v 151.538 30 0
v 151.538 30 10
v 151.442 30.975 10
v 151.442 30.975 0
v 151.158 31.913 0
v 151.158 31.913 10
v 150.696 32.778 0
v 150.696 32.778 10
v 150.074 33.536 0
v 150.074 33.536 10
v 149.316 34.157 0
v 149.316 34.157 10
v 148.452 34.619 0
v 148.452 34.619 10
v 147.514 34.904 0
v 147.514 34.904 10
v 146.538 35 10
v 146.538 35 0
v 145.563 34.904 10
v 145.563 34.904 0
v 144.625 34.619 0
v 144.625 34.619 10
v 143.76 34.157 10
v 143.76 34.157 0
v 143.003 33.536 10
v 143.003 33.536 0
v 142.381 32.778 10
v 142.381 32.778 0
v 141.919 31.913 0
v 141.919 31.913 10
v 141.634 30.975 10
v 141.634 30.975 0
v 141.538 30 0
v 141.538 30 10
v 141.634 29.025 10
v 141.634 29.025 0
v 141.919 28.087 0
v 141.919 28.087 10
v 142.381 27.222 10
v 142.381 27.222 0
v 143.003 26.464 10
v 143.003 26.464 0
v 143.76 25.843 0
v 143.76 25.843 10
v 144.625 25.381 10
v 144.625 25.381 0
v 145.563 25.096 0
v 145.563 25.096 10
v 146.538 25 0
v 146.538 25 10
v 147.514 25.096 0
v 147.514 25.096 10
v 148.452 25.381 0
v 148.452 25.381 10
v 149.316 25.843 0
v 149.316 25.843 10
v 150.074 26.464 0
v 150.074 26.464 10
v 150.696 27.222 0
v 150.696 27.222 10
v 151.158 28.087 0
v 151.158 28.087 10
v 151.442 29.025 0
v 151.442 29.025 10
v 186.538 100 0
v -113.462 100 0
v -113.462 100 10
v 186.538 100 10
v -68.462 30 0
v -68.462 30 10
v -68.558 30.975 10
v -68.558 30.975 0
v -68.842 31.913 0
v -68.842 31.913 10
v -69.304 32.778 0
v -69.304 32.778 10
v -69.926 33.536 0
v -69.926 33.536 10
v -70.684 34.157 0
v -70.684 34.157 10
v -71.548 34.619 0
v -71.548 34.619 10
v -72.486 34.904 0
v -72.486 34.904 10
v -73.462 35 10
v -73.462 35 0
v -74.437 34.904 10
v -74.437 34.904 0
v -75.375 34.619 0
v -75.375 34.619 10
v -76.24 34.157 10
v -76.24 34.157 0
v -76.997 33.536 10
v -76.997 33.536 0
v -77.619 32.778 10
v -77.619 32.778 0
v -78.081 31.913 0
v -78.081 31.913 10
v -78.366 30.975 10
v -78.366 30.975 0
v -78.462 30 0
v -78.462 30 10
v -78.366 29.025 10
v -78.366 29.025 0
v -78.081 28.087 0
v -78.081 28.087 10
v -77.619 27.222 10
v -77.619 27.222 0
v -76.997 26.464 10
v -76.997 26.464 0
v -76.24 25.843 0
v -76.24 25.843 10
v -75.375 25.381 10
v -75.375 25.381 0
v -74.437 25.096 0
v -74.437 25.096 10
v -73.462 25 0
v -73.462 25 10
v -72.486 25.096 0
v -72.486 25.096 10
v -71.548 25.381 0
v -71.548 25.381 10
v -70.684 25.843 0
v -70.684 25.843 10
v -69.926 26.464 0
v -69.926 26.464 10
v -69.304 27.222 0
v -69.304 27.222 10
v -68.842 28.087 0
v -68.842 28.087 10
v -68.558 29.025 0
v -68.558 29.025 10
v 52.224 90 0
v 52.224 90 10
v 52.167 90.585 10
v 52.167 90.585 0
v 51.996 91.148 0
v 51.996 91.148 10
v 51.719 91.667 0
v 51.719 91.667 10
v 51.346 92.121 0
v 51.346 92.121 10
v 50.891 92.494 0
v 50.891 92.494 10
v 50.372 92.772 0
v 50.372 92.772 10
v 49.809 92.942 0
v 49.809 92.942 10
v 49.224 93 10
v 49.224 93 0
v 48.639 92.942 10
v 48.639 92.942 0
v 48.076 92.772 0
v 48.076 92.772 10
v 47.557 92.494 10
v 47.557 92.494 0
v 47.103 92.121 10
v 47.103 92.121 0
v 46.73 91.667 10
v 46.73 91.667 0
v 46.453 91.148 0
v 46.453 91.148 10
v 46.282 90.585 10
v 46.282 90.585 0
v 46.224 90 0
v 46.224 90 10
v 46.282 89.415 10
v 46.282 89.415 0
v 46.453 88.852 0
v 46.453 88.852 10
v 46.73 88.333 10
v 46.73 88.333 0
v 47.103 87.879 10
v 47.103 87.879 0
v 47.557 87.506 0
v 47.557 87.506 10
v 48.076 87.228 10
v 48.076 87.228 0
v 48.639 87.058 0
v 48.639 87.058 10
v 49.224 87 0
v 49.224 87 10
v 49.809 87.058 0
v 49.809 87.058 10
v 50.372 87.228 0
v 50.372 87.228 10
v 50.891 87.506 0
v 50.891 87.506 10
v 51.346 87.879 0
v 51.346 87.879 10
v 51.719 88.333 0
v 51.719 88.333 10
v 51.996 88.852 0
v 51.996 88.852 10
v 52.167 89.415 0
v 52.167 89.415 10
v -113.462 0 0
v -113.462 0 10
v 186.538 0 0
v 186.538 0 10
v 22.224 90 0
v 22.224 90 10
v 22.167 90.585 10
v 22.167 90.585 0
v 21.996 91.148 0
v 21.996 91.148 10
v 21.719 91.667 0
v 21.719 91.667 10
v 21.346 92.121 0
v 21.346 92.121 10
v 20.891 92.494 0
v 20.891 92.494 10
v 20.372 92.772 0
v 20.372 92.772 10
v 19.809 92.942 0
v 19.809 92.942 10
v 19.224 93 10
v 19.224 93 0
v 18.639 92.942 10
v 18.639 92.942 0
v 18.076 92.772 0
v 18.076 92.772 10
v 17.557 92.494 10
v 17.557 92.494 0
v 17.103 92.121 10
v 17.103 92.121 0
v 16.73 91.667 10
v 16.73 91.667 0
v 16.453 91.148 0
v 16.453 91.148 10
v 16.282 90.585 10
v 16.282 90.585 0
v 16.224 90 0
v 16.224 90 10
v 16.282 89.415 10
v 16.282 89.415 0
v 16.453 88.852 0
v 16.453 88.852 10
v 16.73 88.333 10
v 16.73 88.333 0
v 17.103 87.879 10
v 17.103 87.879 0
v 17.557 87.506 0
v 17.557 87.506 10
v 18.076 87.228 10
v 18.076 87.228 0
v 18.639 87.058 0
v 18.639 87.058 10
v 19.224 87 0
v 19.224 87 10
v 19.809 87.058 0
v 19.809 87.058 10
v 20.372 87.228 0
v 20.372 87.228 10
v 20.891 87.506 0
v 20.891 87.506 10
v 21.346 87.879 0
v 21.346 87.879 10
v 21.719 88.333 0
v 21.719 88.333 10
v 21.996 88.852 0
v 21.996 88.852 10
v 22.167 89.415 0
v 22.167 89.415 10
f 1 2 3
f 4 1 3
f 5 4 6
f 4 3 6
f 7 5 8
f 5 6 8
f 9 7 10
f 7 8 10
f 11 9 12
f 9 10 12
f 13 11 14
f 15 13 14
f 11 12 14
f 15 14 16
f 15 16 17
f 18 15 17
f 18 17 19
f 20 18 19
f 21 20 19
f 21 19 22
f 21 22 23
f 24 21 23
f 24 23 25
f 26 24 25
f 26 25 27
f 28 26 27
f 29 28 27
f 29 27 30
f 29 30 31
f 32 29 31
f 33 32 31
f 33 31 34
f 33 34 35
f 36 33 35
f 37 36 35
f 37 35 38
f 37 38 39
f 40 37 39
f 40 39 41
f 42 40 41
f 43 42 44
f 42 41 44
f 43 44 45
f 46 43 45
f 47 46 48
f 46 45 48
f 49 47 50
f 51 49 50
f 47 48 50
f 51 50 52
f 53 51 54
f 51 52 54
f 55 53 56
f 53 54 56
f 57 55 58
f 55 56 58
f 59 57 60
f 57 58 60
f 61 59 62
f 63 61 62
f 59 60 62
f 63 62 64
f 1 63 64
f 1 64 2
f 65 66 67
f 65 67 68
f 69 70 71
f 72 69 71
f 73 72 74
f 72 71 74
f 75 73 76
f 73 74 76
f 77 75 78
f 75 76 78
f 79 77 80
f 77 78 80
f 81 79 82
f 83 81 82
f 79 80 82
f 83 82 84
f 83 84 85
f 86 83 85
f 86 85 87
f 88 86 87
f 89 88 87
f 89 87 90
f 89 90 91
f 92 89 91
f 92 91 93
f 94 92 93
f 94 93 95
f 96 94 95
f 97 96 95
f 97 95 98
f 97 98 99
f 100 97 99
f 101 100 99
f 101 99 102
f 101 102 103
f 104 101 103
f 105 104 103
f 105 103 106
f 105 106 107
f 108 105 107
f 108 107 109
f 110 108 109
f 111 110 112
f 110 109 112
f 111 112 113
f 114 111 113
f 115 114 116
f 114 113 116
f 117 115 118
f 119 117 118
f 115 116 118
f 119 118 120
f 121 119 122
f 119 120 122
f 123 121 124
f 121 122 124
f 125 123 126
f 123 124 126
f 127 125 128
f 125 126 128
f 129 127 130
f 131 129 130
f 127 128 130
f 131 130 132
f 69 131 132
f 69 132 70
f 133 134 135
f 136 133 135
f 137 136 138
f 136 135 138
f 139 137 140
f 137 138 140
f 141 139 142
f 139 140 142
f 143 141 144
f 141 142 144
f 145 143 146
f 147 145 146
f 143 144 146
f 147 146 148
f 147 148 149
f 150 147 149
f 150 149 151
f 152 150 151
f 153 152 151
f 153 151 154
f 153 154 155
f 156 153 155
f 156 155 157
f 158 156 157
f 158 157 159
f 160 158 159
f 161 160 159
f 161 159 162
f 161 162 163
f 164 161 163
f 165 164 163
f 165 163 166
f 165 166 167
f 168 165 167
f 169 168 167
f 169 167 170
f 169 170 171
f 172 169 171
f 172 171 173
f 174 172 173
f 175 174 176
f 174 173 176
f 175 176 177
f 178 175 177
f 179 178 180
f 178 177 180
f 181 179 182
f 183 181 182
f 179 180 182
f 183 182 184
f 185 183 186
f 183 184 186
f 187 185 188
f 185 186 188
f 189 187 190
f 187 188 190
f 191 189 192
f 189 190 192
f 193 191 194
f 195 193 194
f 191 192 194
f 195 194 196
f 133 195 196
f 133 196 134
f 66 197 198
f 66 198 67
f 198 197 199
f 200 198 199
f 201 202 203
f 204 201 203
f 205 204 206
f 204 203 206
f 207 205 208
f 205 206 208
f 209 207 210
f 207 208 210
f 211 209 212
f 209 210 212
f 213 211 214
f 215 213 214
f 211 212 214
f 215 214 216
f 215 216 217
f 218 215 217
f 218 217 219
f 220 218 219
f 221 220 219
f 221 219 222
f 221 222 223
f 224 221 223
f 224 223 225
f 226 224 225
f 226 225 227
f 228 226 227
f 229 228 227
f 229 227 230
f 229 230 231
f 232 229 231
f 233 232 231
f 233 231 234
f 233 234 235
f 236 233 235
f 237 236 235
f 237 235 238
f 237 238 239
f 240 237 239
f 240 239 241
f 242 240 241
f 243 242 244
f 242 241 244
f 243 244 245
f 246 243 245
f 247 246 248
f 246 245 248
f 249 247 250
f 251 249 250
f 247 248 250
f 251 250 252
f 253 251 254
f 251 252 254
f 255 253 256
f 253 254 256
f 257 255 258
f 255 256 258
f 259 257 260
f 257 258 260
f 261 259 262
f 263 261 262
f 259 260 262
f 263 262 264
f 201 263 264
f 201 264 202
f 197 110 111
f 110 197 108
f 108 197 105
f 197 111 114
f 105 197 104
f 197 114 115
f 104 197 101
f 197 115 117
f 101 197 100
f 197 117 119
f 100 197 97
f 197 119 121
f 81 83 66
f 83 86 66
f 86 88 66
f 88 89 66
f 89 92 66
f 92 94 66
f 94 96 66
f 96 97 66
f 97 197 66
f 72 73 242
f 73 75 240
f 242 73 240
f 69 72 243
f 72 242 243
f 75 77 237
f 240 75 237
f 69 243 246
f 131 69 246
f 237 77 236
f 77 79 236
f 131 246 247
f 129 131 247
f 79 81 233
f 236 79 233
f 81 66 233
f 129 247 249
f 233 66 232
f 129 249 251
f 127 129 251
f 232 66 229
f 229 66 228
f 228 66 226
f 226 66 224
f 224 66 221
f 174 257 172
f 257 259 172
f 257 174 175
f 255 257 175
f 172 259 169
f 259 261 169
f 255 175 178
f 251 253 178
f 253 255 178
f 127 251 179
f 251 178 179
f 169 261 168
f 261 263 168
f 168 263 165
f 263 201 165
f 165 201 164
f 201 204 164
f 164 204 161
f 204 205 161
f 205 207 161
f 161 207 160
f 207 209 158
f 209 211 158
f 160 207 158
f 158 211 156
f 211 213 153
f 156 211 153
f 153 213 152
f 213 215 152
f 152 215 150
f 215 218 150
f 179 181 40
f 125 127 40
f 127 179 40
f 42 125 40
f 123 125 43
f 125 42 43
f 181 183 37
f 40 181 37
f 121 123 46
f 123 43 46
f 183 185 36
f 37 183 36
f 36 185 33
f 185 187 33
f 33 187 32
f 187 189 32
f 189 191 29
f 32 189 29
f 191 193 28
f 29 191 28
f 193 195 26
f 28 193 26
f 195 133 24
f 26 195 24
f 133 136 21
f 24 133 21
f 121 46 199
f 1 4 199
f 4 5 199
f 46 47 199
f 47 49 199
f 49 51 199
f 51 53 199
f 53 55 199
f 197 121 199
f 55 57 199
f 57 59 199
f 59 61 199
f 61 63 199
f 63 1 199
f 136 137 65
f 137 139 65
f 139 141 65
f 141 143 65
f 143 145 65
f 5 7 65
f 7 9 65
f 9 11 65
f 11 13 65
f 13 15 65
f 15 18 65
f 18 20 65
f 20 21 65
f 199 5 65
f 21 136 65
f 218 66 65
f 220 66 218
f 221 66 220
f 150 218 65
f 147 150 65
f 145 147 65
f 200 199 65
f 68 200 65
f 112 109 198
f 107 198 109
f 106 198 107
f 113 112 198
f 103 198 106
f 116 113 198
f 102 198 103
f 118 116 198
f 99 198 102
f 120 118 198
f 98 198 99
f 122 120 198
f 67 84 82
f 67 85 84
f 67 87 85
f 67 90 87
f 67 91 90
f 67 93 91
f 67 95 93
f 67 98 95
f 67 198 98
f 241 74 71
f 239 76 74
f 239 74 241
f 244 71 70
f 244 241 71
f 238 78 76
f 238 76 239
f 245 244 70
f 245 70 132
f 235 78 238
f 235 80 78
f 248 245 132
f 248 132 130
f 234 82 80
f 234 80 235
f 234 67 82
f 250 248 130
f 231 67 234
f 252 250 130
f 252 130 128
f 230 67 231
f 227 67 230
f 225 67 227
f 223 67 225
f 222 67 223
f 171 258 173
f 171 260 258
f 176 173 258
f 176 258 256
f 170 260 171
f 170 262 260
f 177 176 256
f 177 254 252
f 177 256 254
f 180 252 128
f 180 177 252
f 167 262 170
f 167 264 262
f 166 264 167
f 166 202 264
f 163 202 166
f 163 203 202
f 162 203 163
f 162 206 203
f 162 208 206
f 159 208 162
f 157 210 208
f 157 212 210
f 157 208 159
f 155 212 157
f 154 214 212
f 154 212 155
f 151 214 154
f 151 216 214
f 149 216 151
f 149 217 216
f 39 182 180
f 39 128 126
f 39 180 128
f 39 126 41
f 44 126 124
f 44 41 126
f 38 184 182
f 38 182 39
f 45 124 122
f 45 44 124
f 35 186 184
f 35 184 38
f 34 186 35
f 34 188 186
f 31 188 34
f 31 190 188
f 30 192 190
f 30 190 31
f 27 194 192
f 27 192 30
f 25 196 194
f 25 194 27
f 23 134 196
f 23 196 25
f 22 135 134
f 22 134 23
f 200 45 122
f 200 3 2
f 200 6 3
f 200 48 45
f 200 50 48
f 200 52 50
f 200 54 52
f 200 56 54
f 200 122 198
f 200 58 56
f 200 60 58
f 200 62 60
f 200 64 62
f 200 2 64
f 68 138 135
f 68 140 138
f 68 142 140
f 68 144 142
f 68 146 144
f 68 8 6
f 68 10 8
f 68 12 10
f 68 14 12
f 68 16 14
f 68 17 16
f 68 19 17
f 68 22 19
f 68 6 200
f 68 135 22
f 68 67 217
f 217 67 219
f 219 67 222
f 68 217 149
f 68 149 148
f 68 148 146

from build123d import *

# Parameters (mm, degrees)
ESQUISSE1_W             = 300
ESQUISSE1_H             = 100
BOSS_EXTRU_1_DEPTH      = 10
ESQUISSE2_R             = 3
ENL_V_MAT_EXTRU_1_DEPTH = 212.887970305
ESQUISSE3_R             = 5
ENL_V_MAT_EXTRU_2_DEPTH = 212.887970305


with BuildPart() as part:
    # Esquisse1 → Boss.-Extru.1 (new body)
    with BuildSketch(Plane.XY):
        with Locations((36.538231899, 50)):
            Rectangle(ESQUISSE1_W, ESQUISSE1_H)
    extrude(amount=BOSS_EXTRU_1_DEPTH)

    # Esquisse2 → Enlèv. mat.-Extru.1 (cut, through all)
    with BuildSketch(Plane.XY.offset(10)):
        with Locations((49.22419633, 90)):
            Circle(ESQUISSE2_R)
        with Locations((19.22419633, 90)):
            Circle(ESQUISSE2_R)
    extrude(amount=-ENL_V_MAT_EXTRU_1_DEPTH, mode=Mode.SUBTRACT)

    # Esquisse3 → Enlèv. mat.-Extru.2 (cut, through all)
    with BuildSketch(Plane.XY.offset(10)):
        with Locations((-73.461768101, 30)):
            Circle(ESQUISSE3_R)
        with Locations((146.538231899, 30)):
            Circle(ESQUISSE3_R)
    extrude(amount=-ENL_V_MAT_EXTRU_2_DEPTH, mode=Mode.SUBTRACT)


solid = part.part
